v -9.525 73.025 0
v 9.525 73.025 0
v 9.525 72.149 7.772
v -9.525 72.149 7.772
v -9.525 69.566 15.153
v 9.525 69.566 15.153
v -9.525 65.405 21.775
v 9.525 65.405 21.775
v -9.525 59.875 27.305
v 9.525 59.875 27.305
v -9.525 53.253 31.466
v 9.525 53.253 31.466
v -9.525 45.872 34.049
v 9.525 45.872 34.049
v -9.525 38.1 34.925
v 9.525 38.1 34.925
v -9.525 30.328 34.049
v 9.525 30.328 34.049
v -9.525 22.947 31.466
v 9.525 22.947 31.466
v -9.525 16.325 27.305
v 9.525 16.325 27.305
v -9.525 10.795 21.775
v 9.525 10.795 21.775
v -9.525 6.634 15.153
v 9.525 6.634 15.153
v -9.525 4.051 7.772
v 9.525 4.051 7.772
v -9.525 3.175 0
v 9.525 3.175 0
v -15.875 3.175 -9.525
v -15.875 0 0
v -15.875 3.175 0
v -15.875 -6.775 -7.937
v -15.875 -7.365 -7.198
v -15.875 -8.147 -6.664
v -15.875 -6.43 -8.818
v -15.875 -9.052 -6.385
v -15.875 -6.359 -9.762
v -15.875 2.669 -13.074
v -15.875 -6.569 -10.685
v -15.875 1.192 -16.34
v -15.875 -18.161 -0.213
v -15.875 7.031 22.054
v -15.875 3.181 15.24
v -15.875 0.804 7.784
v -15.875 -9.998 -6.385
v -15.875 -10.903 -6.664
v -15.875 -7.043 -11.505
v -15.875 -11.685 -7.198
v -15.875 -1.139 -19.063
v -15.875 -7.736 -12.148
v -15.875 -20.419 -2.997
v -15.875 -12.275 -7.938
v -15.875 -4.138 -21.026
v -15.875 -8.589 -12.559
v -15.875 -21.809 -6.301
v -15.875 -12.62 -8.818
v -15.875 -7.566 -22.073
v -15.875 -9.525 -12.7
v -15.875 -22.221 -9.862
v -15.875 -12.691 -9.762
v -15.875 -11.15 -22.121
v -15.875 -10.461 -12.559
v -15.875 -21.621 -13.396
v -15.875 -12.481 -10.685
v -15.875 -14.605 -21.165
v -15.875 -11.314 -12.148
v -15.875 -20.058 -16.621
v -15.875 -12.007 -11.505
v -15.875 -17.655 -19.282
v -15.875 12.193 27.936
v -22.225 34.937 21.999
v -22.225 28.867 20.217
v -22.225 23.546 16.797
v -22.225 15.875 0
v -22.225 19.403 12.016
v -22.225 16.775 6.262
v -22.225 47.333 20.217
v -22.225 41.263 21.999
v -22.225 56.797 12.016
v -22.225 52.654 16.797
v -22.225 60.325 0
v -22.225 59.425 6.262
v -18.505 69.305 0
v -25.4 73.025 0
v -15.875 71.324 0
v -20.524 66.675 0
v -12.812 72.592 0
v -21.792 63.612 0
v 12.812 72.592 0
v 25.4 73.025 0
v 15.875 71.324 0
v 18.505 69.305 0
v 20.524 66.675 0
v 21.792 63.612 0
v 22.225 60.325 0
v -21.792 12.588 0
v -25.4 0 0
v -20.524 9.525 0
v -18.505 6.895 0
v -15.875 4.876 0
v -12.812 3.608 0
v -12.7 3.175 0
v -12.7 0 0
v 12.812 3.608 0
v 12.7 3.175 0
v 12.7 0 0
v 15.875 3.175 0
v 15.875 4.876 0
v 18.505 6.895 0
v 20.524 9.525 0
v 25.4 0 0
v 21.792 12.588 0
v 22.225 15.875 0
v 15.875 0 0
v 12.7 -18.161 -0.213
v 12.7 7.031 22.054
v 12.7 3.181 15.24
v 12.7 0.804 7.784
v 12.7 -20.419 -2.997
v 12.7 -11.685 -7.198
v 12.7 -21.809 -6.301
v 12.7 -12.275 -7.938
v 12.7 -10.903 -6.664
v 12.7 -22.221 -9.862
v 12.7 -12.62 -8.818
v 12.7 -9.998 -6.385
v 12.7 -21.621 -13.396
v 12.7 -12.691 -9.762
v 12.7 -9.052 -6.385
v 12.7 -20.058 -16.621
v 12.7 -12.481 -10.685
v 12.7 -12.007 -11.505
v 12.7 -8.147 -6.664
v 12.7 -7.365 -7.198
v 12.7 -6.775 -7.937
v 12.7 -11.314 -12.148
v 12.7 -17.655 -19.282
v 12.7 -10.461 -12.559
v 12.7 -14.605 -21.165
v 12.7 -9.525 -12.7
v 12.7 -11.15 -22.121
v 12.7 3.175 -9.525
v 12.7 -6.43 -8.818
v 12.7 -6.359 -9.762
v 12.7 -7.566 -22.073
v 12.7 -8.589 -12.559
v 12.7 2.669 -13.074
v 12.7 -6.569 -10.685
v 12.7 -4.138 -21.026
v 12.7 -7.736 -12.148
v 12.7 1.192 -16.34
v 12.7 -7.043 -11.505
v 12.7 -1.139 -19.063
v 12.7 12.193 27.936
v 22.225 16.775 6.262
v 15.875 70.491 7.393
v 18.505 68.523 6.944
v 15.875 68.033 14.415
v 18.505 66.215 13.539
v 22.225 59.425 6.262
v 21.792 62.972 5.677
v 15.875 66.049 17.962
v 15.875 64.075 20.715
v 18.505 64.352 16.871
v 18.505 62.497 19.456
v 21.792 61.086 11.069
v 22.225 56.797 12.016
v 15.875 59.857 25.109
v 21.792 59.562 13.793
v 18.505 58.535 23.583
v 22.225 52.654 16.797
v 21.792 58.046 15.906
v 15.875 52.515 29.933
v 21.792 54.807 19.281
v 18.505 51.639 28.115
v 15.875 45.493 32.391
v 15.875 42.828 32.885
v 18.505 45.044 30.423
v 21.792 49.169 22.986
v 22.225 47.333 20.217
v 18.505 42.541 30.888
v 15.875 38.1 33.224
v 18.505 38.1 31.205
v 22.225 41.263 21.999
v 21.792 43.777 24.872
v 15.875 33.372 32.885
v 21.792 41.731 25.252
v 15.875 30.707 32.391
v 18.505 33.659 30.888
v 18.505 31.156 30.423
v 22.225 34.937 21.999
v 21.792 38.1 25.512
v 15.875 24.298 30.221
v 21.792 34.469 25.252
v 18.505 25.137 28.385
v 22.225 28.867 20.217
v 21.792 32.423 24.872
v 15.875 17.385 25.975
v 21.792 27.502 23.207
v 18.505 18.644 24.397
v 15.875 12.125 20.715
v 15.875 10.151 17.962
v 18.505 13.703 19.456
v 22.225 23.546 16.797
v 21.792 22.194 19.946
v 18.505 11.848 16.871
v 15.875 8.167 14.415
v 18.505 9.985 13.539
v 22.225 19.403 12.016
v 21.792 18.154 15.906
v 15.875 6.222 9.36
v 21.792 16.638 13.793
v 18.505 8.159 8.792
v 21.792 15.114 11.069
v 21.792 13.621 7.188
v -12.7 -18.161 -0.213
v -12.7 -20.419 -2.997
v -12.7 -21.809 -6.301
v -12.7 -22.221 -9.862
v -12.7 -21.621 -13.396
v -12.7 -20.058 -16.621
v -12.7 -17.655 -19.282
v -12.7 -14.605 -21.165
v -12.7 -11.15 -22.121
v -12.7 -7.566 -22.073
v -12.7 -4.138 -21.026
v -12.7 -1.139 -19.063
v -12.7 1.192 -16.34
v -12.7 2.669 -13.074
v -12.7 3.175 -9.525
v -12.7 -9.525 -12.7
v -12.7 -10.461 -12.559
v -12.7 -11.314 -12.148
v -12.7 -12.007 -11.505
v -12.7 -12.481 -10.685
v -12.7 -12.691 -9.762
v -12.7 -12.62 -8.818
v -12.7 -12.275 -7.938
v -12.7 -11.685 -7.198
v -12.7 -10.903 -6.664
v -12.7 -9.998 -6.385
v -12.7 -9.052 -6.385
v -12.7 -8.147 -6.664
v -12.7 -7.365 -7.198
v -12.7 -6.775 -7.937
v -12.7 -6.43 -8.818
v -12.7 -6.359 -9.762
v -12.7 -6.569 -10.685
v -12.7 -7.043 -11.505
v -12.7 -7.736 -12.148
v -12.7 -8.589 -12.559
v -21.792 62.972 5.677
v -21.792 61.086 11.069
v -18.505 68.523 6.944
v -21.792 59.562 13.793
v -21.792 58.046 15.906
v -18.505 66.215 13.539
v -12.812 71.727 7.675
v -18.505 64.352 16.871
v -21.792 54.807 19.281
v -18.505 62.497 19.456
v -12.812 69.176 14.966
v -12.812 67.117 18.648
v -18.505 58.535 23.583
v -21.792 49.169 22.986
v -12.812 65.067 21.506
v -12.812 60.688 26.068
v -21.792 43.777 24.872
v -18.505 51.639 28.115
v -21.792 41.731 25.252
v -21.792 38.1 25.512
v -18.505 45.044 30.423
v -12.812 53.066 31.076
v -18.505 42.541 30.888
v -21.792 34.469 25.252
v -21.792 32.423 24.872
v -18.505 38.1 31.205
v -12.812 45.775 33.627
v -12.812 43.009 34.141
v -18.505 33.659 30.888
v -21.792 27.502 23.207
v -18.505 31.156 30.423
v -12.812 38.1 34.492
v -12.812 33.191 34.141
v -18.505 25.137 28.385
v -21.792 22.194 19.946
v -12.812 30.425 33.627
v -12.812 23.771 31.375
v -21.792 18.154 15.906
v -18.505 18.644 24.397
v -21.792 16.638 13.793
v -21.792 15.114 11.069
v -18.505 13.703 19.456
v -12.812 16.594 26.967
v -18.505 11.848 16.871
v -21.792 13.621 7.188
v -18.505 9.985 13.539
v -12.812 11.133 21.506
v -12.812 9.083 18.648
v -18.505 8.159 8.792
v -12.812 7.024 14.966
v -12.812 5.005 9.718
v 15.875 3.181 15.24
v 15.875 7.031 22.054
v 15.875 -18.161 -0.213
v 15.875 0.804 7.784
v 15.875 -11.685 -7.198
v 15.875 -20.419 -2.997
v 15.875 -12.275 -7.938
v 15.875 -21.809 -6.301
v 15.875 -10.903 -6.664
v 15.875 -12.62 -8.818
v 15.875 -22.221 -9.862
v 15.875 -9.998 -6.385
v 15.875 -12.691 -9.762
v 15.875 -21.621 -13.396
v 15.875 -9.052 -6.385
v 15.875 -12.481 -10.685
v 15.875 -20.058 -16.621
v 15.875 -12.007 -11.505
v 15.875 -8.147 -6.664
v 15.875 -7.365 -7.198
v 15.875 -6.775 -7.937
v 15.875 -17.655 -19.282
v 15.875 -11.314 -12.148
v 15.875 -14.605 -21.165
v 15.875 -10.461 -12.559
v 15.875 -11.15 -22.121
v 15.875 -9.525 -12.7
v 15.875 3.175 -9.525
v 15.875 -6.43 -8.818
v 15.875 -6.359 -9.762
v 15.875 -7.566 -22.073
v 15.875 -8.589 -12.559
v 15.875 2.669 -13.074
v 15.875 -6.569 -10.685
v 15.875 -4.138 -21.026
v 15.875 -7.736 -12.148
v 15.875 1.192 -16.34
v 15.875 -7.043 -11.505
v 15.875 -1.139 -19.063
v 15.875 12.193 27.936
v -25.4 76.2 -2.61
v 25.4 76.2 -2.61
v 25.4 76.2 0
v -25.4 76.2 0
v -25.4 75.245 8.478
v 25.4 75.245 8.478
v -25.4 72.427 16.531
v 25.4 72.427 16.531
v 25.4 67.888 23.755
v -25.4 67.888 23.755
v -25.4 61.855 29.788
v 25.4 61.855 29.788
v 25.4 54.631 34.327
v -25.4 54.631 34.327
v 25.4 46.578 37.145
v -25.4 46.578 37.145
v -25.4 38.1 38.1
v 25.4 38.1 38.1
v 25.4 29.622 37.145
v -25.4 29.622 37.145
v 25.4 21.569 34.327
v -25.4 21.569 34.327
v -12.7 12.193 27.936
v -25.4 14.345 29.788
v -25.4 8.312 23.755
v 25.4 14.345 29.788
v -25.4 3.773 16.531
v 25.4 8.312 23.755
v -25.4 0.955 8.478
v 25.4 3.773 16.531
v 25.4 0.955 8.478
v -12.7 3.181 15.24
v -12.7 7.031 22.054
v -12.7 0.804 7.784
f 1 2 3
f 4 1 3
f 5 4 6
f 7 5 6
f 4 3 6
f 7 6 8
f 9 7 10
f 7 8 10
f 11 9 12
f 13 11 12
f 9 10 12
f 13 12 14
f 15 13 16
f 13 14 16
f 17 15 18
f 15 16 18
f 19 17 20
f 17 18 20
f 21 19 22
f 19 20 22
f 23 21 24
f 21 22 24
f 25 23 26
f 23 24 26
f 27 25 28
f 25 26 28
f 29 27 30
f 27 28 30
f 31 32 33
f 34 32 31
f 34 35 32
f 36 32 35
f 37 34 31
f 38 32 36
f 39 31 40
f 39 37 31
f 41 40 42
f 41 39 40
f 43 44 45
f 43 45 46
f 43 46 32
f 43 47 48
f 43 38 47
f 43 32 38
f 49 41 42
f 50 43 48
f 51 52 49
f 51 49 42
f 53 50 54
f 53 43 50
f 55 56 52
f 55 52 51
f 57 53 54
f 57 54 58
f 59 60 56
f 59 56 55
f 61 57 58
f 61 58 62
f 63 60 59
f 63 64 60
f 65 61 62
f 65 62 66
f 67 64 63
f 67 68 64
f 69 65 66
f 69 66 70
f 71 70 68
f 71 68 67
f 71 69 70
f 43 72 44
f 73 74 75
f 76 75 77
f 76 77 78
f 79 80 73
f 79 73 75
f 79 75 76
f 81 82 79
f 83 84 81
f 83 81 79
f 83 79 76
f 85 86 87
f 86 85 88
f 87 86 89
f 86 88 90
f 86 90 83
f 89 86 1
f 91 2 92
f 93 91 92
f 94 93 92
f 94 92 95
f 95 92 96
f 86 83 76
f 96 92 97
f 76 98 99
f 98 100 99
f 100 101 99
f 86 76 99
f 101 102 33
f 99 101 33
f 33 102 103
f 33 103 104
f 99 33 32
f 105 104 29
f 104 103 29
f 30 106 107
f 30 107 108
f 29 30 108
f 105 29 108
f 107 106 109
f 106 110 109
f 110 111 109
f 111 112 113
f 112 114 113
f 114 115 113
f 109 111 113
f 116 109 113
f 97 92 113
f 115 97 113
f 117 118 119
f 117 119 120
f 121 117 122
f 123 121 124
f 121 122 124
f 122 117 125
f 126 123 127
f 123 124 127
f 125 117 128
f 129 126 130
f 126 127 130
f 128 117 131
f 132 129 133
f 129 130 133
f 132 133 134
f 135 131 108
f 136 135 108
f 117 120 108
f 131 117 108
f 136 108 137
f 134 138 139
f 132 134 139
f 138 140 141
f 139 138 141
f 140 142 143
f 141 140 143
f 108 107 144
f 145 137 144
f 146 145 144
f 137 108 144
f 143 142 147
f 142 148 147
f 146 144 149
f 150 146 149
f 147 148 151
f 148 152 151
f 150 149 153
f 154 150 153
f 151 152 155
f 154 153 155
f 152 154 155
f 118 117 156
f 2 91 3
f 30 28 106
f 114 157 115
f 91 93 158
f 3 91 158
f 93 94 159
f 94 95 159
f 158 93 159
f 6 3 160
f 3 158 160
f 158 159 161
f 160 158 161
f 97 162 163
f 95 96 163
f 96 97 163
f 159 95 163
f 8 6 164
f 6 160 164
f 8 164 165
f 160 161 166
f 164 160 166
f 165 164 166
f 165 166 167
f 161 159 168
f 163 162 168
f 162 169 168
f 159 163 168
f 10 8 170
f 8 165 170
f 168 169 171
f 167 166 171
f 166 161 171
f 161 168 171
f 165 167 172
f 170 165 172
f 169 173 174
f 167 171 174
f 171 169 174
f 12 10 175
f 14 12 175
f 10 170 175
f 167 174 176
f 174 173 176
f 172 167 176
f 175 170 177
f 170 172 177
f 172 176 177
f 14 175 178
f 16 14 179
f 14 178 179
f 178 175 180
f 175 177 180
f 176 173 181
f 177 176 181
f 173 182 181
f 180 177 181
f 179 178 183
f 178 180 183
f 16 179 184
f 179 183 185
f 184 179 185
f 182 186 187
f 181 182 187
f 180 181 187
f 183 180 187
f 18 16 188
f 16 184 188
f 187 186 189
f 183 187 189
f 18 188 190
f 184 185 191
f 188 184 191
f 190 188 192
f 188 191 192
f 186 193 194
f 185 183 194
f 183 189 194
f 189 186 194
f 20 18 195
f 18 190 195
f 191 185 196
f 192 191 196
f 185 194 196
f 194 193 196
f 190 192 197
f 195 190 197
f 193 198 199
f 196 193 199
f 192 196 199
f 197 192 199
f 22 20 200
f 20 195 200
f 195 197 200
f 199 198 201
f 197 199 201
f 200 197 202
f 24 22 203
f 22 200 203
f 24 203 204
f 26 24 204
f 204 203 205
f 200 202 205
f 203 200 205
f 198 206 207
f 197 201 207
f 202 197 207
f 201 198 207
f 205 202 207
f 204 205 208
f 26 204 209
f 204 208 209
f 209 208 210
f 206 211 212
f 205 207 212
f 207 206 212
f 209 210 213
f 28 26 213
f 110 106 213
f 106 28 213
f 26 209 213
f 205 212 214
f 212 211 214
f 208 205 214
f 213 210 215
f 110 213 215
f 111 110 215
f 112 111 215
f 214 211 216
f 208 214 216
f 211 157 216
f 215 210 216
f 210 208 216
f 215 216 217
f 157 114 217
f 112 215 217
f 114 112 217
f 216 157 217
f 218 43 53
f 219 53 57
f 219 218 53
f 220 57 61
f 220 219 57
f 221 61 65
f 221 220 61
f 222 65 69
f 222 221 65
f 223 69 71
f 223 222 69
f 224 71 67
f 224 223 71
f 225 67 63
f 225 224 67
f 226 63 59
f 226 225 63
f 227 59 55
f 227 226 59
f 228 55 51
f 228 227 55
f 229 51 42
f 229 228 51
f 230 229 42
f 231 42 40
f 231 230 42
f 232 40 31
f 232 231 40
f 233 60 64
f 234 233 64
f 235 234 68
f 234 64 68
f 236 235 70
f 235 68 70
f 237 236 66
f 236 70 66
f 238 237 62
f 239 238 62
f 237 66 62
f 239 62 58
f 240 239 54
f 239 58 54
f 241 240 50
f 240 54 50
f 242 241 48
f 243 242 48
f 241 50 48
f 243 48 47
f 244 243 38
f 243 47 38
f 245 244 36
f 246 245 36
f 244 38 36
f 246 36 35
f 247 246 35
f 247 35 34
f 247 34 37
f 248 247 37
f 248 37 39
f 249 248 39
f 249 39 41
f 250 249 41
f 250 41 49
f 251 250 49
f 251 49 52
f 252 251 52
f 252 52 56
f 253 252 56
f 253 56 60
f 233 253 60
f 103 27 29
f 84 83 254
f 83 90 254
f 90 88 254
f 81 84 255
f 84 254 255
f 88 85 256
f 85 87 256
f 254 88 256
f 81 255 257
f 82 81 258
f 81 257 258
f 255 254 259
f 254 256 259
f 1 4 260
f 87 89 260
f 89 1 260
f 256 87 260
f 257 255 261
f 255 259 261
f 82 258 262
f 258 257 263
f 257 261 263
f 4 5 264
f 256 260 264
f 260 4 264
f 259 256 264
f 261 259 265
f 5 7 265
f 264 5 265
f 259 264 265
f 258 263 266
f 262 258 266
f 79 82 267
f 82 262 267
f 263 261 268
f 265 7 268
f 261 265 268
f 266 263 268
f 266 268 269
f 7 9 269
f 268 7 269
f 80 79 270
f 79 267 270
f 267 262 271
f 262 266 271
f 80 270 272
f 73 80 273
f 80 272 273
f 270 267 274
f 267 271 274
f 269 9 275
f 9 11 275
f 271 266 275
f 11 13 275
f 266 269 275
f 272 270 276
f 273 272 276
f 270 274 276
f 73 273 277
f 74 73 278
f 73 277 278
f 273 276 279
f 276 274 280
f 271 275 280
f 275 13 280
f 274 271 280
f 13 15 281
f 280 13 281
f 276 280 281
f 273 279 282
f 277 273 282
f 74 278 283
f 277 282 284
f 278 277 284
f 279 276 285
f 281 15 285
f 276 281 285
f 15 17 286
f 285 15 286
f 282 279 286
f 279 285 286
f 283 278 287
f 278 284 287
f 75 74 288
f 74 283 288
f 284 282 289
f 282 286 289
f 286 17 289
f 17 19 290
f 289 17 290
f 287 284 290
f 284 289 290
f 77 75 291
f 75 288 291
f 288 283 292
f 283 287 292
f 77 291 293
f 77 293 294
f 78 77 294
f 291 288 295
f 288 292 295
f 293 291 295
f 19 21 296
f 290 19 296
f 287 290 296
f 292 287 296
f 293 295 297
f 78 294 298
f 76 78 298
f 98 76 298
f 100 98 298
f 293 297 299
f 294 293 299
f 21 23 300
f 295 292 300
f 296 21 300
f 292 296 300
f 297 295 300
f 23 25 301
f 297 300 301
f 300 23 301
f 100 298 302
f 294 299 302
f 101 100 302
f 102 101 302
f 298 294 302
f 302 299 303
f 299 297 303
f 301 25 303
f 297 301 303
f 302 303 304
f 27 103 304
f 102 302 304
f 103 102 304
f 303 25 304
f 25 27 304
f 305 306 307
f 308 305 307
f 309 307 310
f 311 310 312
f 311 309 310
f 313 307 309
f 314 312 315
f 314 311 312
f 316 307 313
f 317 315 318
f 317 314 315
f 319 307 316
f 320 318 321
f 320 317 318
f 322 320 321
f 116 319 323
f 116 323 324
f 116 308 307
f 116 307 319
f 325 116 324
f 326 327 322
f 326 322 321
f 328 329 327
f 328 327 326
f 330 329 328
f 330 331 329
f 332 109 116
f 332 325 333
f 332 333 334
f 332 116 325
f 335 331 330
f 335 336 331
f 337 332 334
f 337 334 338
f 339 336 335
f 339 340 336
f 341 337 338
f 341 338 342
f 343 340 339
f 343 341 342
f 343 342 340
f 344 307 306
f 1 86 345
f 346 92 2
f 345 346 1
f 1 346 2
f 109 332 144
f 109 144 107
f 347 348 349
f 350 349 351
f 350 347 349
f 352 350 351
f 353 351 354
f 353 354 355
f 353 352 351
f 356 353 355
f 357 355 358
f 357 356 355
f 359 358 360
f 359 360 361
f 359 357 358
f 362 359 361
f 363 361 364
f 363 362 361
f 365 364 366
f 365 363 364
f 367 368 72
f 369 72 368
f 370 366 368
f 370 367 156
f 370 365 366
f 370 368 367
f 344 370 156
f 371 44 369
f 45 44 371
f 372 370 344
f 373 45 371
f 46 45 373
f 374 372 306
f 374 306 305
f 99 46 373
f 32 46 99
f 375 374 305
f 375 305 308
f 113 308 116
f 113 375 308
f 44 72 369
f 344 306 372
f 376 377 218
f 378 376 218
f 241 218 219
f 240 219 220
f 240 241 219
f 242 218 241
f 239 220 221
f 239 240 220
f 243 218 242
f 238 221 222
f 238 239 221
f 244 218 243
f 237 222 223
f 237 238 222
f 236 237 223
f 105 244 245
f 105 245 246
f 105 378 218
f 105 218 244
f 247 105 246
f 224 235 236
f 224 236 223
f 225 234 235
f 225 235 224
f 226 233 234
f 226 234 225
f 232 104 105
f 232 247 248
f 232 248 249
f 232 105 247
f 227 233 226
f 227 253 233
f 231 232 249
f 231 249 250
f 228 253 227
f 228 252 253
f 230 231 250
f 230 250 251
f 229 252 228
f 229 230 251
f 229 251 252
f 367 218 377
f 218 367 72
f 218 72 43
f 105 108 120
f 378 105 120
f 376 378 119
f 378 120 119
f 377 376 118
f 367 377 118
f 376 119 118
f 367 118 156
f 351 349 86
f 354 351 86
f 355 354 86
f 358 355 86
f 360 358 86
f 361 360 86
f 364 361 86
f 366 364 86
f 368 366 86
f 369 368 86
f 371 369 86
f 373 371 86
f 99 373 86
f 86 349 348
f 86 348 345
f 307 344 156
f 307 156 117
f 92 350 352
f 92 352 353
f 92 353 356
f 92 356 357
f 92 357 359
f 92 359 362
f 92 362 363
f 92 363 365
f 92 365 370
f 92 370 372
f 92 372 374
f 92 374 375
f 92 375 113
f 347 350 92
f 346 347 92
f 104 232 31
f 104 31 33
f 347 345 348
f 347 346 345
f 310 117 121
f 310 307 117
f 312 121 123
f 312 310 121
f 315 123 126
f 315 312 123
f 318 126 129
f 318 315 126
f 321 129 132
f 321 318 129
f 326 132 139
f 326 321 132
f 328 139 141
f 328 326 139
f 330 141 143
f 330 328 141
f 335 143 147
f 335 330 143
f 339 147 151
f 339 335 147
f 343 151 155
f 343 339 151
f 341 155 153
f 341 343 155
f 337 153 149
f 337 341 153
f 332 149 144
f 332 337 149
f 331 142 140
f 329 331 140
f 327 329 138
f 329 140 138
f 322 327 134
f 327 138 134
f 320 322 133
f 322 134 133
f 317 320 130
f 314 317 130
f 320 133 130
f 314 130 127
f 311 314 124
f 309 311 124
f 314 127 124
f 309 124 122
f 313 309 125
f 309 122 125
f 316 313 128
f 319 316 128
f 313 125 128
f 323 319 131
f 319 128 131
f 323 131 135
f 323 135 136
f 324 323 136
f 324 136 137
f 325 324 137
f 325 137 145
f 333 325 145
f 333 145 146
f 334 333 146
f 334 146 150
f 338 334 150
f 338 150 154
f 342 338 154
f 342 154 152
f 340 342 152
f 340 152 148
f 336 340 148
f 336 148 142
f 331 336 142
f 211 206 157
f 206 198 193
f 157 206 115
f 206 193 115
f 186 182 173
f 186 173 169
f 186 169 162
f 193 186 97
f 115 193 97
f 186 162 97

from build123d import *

# Parameters (mm, degrees)
BOSS_EXTRUDE1_DEPTH = 25.4
SHELL1_T            = -3.175
SKETCH4_R           = 12.7
BOSS_EXTRUDE3_DEPTH = 15.875
BOSS_EXTRUDE4_DEPTH = 15.875
SKETCH6_R           = 12.7
CUT_EXTRUDE2_DEPTH  = 12.7
CUT_EXTRUDE3_START  = 12.7
SKETCH6_2_R         = 12.7
CUT_EXTRUDE3_DEPTH  = 12.7
CUT_EXTRUDE4_REACH  = 96.666
SKETCH7_R           = 3.175
BOSS_EXTRUDE5_REACH = 96.666
CUT_EXTRUDE5_DEPTH  = 12.7
BOSS_EXTRUDE6_DEPTH = 25.4
FILLET2_R           = 12.7


with BuildPart() as part:
    # Sketch2 → Boss-Extrude1 (new, symmetric)
    with BuildSketch(Plane(origin=(0, 0, 0), x_dir=(0, 0, -1), z_dir=(1, 0, 0))):
        with BuildLine():
            Line((0, 0), (0, 76.2))
            ThreePointArc((0, 76.2), (-38.1, 38.1), (0, 0))
        make_face()
    extrude(amount=BOSS_EXTRUDE1_DEPTH, both=True)

    # Shell1
    shell1_openings = [part.faces().sort_by_distance(p)[0] for p in [
        (0, 38.1, 0),
    ]]
    offset(amount=SHELL1_T, openings=shell1_openings)



with BuildPart() as body_2:
    # Sketch4 → Boss-Extrude3 (new, symmetric)
    with BuildSketch(Plane(origin=(0, 0, 0), x_dir=(0, 0, -1), z_dir=(1, 0, 0))):
        with Locations((9.525, -9.525)):
            Circle(SKETCH4_R)
    extrude(amount=BOSS_EXTRUDE3_DEPTH, both=True)


with BuildPart() as part_1:
    add(part.part)

    add(body_2.part)  # Boss-Extrude4 merges body 2
    # Sketch5 → Boss-Extrude4 (add, symmetric)
    with BuildSketch(Plane(origin=(0, 0, 0), x_dir=(0, 0, -1), z_dir=(1, 0, 0))):
        with BuildLine():
            Line((0, 3.175), (0, 0))
            Line((0, 0), (1.124739587, 0))
            ThreePointArc((1.124739587, 0), (5.034871939, 2.354762203), (9.525, 3.175))
            Line((9.525, 3.175), (0, 3.175))
        make_face()
    extrude(amount=BOSS_EXTRUDE4_DEPTH, both=True)

    # Sketch6 → Cut-Extrude2 (cut)
    with BuildSketch(Plane(origin=(0, 0, 0), x_dir=(0, 0, -1), z_dir=(1, 0, 0))):
        with Locations((8.980256121, -8.980256121)):
            Circle(SKETCH6_R)
    extrude(amount=-CUT_EXTRUDE2_DEPTH, mode=Mode.SUBTRACT)

    # Sketch6<2> → Cut-Extrude3 (cut)
    with BuildSketch(Plane(origin=(0, 0, 0), x_dir=(0, 0, -1), z_dir=(1, 0, 0)).offset(CUT_EXTRUDE3_START)):
        with Locations((8.980256121, -8.980256121)):
            Circle(SKETCH6_2_R)
    extrude(amount=-CUT_EXTRUDE3_DEPTH, mode=Mode.SUBTRACT)

    # Cut-Extrude4: up to this face of the body (flat: up to its plane)
    cut_extrude4_end = Plane(part_1.part.faces().sort_by_distance((15.875, -9.258016607, -9.360446087))[0])
    # Sketch7 → Cut-Extrude4 (cut, up to the picked face)
    with BuildSketch(Plane.ZY.offset(15.875), mode=Mode.PRIVATE) as cut_extrude4_sk1:
        with Locations(Location((-9.525, -9.525, 0), (0, 0, 180))):
            Circle(SKETCH7_R)
    cut_extrude4_tool1 = split(extrude(cut_extrude4_sk1.sketch, amount=-CUT_EXTRUDE4_REACH, mode=Mode.PRIVATE), bisect_by=cut_extrude4_end, keep=Keep.BOTH, mode=Mode.PRIVATE)
    add(cut_extrude4_tool1.solids().sort_by(Axis((-15.875, -9.525, -9.525), (1, 0, 0)))[0], mode=Mode.SUBTRACT)

    # Boss-Extrude5: up to this face of the body (flat: up to its plane)
    boss_extrude5_end = Plane(part_1.part.faces().sort_by_distance((-15.875, 2.815789755, -4.7625))[0])
    # Sketch8 → Boss-Extrude5 (add, up to the picked face)
    with BuildSketch(Plane(origin=(15.875, 0, 0), x_dir=(0, 0, -1), z_dir=(1, 0, 0)), mode=Mode.PRIVATE) as boss_extrude5_sk1:
        with BuildLine():
            Line((-27.936104056, 12.192779189), (0.212965315, -18.16074027))
            Line((0.212965315, -18.16074027), (5.034871939, -21.404762203))
            Line((5.034871939, -21.404762203), (1.124739587, 0))
            Line((1.124739587, 0), (0, 3.175))
            ThreePointArc((0, 3.175), (-13.704863106, 5.9762961), (-25.211222013, 13.9308066))
            Line((-25.211222013, 13.9308066), (-27.936104056, 12.192779189))
        make_face()
    boss_extrude5_tool1 = split(extrude(boss_extrude5_sk1.sketch, amount=-BOSS_EXTRUDE5_REACH, mode=Mode.PRIVATE), bisect_by=boss_extrude5_end, keep=Keep.BOTH, mode=Mode.PRIVATE)
    add(boss_extrude5_tool1.solids().sort_by(Axis((15.875, -2.840531, 7.724646), (-1, 0, 0)))[0])

    # Sketch9 → Cut-Extrude5 (cut, symmetric)
    with BuildSketch(Plane(origin=(0, 0, 0), x_dir=(0, 0, -1), z_dir=(1, 0, 0))):
        with BuildLine():
            Line((0, 3.175), (0, 0))
            ThreePointArc((0, 0), (-15.240486985, 3.180985746), (-27.936104056, 12.192779189))
            Line((-27.936104056, 12.192779189), (0.212965315, -18.16074027))
            ThreePointArc((0.212965315, -18.16074027), (21.164671418, -14.605162328), (9.525, 3.175))
            Line((9.525, 3.175), (0, 3.175))
        make_face()
    extrude(amount=CUT_EXTRUDE5_DEPTH, both=True, mode=Mode.SUBTRACT)

    # Sketch11 → Boss-Extrude6 (add, symmetric)
    with BuildSketch(Plane(origin=(0, 0, 0), x_dir=(0, 0, -1), z_dir=(1, 0, 0))):
        Polygon((2.609832197, 76.2), (0, 76.2), (0, 73.025), align=None)
    extrude(amount=BOSS_EXTRUDE6_DEPTH, both=True)

    # Fillet2
    # the kernel refuses this fillet: 12.7 mm, written as the material it adds along each edge
    with BuildSketch(Plane(origin=(-22.225, 38.1, 0), x_dir=(0, 1, 0), z_dir=(0, 0, -1))) as fillet2_piece_1:
        with BuildLine():
            CenterArc((34.925 - FILLET2_R, FILLET2_R), FILLET2_R, 270, 90)
            Line((34.925 - FILLET2_R, 0), (34.925, 0))
            Line((34.925, 0), (34.925, FILLET2_R))
        make_face()
    revolve(axis=Axis((-22.225, 38.1, 0), (1, 0, 0)), revolution_arc=180)
    with BuildSketch(Plane(origin=(22.225, 38.1, 0), x_dir=(0, 1, 0), z_dir=(0, 0, -1))) as fillet2_piece_2:
        with BuildLine():
            CenterArc((34.925 - FILLET2_R, -FILLET2_R), FILLET2_R, 0, 90)
            Line((34.925 - FILLET2_R, 0), (34.925, 0))
            Line((34.925, 0), (34.925, -FILLET2_R))
        make_face()
    revolve(axis=Axis((22.225, 38.1, 0), (1, 0, 0)), revolution_arc=180)


solid = part_1.part
